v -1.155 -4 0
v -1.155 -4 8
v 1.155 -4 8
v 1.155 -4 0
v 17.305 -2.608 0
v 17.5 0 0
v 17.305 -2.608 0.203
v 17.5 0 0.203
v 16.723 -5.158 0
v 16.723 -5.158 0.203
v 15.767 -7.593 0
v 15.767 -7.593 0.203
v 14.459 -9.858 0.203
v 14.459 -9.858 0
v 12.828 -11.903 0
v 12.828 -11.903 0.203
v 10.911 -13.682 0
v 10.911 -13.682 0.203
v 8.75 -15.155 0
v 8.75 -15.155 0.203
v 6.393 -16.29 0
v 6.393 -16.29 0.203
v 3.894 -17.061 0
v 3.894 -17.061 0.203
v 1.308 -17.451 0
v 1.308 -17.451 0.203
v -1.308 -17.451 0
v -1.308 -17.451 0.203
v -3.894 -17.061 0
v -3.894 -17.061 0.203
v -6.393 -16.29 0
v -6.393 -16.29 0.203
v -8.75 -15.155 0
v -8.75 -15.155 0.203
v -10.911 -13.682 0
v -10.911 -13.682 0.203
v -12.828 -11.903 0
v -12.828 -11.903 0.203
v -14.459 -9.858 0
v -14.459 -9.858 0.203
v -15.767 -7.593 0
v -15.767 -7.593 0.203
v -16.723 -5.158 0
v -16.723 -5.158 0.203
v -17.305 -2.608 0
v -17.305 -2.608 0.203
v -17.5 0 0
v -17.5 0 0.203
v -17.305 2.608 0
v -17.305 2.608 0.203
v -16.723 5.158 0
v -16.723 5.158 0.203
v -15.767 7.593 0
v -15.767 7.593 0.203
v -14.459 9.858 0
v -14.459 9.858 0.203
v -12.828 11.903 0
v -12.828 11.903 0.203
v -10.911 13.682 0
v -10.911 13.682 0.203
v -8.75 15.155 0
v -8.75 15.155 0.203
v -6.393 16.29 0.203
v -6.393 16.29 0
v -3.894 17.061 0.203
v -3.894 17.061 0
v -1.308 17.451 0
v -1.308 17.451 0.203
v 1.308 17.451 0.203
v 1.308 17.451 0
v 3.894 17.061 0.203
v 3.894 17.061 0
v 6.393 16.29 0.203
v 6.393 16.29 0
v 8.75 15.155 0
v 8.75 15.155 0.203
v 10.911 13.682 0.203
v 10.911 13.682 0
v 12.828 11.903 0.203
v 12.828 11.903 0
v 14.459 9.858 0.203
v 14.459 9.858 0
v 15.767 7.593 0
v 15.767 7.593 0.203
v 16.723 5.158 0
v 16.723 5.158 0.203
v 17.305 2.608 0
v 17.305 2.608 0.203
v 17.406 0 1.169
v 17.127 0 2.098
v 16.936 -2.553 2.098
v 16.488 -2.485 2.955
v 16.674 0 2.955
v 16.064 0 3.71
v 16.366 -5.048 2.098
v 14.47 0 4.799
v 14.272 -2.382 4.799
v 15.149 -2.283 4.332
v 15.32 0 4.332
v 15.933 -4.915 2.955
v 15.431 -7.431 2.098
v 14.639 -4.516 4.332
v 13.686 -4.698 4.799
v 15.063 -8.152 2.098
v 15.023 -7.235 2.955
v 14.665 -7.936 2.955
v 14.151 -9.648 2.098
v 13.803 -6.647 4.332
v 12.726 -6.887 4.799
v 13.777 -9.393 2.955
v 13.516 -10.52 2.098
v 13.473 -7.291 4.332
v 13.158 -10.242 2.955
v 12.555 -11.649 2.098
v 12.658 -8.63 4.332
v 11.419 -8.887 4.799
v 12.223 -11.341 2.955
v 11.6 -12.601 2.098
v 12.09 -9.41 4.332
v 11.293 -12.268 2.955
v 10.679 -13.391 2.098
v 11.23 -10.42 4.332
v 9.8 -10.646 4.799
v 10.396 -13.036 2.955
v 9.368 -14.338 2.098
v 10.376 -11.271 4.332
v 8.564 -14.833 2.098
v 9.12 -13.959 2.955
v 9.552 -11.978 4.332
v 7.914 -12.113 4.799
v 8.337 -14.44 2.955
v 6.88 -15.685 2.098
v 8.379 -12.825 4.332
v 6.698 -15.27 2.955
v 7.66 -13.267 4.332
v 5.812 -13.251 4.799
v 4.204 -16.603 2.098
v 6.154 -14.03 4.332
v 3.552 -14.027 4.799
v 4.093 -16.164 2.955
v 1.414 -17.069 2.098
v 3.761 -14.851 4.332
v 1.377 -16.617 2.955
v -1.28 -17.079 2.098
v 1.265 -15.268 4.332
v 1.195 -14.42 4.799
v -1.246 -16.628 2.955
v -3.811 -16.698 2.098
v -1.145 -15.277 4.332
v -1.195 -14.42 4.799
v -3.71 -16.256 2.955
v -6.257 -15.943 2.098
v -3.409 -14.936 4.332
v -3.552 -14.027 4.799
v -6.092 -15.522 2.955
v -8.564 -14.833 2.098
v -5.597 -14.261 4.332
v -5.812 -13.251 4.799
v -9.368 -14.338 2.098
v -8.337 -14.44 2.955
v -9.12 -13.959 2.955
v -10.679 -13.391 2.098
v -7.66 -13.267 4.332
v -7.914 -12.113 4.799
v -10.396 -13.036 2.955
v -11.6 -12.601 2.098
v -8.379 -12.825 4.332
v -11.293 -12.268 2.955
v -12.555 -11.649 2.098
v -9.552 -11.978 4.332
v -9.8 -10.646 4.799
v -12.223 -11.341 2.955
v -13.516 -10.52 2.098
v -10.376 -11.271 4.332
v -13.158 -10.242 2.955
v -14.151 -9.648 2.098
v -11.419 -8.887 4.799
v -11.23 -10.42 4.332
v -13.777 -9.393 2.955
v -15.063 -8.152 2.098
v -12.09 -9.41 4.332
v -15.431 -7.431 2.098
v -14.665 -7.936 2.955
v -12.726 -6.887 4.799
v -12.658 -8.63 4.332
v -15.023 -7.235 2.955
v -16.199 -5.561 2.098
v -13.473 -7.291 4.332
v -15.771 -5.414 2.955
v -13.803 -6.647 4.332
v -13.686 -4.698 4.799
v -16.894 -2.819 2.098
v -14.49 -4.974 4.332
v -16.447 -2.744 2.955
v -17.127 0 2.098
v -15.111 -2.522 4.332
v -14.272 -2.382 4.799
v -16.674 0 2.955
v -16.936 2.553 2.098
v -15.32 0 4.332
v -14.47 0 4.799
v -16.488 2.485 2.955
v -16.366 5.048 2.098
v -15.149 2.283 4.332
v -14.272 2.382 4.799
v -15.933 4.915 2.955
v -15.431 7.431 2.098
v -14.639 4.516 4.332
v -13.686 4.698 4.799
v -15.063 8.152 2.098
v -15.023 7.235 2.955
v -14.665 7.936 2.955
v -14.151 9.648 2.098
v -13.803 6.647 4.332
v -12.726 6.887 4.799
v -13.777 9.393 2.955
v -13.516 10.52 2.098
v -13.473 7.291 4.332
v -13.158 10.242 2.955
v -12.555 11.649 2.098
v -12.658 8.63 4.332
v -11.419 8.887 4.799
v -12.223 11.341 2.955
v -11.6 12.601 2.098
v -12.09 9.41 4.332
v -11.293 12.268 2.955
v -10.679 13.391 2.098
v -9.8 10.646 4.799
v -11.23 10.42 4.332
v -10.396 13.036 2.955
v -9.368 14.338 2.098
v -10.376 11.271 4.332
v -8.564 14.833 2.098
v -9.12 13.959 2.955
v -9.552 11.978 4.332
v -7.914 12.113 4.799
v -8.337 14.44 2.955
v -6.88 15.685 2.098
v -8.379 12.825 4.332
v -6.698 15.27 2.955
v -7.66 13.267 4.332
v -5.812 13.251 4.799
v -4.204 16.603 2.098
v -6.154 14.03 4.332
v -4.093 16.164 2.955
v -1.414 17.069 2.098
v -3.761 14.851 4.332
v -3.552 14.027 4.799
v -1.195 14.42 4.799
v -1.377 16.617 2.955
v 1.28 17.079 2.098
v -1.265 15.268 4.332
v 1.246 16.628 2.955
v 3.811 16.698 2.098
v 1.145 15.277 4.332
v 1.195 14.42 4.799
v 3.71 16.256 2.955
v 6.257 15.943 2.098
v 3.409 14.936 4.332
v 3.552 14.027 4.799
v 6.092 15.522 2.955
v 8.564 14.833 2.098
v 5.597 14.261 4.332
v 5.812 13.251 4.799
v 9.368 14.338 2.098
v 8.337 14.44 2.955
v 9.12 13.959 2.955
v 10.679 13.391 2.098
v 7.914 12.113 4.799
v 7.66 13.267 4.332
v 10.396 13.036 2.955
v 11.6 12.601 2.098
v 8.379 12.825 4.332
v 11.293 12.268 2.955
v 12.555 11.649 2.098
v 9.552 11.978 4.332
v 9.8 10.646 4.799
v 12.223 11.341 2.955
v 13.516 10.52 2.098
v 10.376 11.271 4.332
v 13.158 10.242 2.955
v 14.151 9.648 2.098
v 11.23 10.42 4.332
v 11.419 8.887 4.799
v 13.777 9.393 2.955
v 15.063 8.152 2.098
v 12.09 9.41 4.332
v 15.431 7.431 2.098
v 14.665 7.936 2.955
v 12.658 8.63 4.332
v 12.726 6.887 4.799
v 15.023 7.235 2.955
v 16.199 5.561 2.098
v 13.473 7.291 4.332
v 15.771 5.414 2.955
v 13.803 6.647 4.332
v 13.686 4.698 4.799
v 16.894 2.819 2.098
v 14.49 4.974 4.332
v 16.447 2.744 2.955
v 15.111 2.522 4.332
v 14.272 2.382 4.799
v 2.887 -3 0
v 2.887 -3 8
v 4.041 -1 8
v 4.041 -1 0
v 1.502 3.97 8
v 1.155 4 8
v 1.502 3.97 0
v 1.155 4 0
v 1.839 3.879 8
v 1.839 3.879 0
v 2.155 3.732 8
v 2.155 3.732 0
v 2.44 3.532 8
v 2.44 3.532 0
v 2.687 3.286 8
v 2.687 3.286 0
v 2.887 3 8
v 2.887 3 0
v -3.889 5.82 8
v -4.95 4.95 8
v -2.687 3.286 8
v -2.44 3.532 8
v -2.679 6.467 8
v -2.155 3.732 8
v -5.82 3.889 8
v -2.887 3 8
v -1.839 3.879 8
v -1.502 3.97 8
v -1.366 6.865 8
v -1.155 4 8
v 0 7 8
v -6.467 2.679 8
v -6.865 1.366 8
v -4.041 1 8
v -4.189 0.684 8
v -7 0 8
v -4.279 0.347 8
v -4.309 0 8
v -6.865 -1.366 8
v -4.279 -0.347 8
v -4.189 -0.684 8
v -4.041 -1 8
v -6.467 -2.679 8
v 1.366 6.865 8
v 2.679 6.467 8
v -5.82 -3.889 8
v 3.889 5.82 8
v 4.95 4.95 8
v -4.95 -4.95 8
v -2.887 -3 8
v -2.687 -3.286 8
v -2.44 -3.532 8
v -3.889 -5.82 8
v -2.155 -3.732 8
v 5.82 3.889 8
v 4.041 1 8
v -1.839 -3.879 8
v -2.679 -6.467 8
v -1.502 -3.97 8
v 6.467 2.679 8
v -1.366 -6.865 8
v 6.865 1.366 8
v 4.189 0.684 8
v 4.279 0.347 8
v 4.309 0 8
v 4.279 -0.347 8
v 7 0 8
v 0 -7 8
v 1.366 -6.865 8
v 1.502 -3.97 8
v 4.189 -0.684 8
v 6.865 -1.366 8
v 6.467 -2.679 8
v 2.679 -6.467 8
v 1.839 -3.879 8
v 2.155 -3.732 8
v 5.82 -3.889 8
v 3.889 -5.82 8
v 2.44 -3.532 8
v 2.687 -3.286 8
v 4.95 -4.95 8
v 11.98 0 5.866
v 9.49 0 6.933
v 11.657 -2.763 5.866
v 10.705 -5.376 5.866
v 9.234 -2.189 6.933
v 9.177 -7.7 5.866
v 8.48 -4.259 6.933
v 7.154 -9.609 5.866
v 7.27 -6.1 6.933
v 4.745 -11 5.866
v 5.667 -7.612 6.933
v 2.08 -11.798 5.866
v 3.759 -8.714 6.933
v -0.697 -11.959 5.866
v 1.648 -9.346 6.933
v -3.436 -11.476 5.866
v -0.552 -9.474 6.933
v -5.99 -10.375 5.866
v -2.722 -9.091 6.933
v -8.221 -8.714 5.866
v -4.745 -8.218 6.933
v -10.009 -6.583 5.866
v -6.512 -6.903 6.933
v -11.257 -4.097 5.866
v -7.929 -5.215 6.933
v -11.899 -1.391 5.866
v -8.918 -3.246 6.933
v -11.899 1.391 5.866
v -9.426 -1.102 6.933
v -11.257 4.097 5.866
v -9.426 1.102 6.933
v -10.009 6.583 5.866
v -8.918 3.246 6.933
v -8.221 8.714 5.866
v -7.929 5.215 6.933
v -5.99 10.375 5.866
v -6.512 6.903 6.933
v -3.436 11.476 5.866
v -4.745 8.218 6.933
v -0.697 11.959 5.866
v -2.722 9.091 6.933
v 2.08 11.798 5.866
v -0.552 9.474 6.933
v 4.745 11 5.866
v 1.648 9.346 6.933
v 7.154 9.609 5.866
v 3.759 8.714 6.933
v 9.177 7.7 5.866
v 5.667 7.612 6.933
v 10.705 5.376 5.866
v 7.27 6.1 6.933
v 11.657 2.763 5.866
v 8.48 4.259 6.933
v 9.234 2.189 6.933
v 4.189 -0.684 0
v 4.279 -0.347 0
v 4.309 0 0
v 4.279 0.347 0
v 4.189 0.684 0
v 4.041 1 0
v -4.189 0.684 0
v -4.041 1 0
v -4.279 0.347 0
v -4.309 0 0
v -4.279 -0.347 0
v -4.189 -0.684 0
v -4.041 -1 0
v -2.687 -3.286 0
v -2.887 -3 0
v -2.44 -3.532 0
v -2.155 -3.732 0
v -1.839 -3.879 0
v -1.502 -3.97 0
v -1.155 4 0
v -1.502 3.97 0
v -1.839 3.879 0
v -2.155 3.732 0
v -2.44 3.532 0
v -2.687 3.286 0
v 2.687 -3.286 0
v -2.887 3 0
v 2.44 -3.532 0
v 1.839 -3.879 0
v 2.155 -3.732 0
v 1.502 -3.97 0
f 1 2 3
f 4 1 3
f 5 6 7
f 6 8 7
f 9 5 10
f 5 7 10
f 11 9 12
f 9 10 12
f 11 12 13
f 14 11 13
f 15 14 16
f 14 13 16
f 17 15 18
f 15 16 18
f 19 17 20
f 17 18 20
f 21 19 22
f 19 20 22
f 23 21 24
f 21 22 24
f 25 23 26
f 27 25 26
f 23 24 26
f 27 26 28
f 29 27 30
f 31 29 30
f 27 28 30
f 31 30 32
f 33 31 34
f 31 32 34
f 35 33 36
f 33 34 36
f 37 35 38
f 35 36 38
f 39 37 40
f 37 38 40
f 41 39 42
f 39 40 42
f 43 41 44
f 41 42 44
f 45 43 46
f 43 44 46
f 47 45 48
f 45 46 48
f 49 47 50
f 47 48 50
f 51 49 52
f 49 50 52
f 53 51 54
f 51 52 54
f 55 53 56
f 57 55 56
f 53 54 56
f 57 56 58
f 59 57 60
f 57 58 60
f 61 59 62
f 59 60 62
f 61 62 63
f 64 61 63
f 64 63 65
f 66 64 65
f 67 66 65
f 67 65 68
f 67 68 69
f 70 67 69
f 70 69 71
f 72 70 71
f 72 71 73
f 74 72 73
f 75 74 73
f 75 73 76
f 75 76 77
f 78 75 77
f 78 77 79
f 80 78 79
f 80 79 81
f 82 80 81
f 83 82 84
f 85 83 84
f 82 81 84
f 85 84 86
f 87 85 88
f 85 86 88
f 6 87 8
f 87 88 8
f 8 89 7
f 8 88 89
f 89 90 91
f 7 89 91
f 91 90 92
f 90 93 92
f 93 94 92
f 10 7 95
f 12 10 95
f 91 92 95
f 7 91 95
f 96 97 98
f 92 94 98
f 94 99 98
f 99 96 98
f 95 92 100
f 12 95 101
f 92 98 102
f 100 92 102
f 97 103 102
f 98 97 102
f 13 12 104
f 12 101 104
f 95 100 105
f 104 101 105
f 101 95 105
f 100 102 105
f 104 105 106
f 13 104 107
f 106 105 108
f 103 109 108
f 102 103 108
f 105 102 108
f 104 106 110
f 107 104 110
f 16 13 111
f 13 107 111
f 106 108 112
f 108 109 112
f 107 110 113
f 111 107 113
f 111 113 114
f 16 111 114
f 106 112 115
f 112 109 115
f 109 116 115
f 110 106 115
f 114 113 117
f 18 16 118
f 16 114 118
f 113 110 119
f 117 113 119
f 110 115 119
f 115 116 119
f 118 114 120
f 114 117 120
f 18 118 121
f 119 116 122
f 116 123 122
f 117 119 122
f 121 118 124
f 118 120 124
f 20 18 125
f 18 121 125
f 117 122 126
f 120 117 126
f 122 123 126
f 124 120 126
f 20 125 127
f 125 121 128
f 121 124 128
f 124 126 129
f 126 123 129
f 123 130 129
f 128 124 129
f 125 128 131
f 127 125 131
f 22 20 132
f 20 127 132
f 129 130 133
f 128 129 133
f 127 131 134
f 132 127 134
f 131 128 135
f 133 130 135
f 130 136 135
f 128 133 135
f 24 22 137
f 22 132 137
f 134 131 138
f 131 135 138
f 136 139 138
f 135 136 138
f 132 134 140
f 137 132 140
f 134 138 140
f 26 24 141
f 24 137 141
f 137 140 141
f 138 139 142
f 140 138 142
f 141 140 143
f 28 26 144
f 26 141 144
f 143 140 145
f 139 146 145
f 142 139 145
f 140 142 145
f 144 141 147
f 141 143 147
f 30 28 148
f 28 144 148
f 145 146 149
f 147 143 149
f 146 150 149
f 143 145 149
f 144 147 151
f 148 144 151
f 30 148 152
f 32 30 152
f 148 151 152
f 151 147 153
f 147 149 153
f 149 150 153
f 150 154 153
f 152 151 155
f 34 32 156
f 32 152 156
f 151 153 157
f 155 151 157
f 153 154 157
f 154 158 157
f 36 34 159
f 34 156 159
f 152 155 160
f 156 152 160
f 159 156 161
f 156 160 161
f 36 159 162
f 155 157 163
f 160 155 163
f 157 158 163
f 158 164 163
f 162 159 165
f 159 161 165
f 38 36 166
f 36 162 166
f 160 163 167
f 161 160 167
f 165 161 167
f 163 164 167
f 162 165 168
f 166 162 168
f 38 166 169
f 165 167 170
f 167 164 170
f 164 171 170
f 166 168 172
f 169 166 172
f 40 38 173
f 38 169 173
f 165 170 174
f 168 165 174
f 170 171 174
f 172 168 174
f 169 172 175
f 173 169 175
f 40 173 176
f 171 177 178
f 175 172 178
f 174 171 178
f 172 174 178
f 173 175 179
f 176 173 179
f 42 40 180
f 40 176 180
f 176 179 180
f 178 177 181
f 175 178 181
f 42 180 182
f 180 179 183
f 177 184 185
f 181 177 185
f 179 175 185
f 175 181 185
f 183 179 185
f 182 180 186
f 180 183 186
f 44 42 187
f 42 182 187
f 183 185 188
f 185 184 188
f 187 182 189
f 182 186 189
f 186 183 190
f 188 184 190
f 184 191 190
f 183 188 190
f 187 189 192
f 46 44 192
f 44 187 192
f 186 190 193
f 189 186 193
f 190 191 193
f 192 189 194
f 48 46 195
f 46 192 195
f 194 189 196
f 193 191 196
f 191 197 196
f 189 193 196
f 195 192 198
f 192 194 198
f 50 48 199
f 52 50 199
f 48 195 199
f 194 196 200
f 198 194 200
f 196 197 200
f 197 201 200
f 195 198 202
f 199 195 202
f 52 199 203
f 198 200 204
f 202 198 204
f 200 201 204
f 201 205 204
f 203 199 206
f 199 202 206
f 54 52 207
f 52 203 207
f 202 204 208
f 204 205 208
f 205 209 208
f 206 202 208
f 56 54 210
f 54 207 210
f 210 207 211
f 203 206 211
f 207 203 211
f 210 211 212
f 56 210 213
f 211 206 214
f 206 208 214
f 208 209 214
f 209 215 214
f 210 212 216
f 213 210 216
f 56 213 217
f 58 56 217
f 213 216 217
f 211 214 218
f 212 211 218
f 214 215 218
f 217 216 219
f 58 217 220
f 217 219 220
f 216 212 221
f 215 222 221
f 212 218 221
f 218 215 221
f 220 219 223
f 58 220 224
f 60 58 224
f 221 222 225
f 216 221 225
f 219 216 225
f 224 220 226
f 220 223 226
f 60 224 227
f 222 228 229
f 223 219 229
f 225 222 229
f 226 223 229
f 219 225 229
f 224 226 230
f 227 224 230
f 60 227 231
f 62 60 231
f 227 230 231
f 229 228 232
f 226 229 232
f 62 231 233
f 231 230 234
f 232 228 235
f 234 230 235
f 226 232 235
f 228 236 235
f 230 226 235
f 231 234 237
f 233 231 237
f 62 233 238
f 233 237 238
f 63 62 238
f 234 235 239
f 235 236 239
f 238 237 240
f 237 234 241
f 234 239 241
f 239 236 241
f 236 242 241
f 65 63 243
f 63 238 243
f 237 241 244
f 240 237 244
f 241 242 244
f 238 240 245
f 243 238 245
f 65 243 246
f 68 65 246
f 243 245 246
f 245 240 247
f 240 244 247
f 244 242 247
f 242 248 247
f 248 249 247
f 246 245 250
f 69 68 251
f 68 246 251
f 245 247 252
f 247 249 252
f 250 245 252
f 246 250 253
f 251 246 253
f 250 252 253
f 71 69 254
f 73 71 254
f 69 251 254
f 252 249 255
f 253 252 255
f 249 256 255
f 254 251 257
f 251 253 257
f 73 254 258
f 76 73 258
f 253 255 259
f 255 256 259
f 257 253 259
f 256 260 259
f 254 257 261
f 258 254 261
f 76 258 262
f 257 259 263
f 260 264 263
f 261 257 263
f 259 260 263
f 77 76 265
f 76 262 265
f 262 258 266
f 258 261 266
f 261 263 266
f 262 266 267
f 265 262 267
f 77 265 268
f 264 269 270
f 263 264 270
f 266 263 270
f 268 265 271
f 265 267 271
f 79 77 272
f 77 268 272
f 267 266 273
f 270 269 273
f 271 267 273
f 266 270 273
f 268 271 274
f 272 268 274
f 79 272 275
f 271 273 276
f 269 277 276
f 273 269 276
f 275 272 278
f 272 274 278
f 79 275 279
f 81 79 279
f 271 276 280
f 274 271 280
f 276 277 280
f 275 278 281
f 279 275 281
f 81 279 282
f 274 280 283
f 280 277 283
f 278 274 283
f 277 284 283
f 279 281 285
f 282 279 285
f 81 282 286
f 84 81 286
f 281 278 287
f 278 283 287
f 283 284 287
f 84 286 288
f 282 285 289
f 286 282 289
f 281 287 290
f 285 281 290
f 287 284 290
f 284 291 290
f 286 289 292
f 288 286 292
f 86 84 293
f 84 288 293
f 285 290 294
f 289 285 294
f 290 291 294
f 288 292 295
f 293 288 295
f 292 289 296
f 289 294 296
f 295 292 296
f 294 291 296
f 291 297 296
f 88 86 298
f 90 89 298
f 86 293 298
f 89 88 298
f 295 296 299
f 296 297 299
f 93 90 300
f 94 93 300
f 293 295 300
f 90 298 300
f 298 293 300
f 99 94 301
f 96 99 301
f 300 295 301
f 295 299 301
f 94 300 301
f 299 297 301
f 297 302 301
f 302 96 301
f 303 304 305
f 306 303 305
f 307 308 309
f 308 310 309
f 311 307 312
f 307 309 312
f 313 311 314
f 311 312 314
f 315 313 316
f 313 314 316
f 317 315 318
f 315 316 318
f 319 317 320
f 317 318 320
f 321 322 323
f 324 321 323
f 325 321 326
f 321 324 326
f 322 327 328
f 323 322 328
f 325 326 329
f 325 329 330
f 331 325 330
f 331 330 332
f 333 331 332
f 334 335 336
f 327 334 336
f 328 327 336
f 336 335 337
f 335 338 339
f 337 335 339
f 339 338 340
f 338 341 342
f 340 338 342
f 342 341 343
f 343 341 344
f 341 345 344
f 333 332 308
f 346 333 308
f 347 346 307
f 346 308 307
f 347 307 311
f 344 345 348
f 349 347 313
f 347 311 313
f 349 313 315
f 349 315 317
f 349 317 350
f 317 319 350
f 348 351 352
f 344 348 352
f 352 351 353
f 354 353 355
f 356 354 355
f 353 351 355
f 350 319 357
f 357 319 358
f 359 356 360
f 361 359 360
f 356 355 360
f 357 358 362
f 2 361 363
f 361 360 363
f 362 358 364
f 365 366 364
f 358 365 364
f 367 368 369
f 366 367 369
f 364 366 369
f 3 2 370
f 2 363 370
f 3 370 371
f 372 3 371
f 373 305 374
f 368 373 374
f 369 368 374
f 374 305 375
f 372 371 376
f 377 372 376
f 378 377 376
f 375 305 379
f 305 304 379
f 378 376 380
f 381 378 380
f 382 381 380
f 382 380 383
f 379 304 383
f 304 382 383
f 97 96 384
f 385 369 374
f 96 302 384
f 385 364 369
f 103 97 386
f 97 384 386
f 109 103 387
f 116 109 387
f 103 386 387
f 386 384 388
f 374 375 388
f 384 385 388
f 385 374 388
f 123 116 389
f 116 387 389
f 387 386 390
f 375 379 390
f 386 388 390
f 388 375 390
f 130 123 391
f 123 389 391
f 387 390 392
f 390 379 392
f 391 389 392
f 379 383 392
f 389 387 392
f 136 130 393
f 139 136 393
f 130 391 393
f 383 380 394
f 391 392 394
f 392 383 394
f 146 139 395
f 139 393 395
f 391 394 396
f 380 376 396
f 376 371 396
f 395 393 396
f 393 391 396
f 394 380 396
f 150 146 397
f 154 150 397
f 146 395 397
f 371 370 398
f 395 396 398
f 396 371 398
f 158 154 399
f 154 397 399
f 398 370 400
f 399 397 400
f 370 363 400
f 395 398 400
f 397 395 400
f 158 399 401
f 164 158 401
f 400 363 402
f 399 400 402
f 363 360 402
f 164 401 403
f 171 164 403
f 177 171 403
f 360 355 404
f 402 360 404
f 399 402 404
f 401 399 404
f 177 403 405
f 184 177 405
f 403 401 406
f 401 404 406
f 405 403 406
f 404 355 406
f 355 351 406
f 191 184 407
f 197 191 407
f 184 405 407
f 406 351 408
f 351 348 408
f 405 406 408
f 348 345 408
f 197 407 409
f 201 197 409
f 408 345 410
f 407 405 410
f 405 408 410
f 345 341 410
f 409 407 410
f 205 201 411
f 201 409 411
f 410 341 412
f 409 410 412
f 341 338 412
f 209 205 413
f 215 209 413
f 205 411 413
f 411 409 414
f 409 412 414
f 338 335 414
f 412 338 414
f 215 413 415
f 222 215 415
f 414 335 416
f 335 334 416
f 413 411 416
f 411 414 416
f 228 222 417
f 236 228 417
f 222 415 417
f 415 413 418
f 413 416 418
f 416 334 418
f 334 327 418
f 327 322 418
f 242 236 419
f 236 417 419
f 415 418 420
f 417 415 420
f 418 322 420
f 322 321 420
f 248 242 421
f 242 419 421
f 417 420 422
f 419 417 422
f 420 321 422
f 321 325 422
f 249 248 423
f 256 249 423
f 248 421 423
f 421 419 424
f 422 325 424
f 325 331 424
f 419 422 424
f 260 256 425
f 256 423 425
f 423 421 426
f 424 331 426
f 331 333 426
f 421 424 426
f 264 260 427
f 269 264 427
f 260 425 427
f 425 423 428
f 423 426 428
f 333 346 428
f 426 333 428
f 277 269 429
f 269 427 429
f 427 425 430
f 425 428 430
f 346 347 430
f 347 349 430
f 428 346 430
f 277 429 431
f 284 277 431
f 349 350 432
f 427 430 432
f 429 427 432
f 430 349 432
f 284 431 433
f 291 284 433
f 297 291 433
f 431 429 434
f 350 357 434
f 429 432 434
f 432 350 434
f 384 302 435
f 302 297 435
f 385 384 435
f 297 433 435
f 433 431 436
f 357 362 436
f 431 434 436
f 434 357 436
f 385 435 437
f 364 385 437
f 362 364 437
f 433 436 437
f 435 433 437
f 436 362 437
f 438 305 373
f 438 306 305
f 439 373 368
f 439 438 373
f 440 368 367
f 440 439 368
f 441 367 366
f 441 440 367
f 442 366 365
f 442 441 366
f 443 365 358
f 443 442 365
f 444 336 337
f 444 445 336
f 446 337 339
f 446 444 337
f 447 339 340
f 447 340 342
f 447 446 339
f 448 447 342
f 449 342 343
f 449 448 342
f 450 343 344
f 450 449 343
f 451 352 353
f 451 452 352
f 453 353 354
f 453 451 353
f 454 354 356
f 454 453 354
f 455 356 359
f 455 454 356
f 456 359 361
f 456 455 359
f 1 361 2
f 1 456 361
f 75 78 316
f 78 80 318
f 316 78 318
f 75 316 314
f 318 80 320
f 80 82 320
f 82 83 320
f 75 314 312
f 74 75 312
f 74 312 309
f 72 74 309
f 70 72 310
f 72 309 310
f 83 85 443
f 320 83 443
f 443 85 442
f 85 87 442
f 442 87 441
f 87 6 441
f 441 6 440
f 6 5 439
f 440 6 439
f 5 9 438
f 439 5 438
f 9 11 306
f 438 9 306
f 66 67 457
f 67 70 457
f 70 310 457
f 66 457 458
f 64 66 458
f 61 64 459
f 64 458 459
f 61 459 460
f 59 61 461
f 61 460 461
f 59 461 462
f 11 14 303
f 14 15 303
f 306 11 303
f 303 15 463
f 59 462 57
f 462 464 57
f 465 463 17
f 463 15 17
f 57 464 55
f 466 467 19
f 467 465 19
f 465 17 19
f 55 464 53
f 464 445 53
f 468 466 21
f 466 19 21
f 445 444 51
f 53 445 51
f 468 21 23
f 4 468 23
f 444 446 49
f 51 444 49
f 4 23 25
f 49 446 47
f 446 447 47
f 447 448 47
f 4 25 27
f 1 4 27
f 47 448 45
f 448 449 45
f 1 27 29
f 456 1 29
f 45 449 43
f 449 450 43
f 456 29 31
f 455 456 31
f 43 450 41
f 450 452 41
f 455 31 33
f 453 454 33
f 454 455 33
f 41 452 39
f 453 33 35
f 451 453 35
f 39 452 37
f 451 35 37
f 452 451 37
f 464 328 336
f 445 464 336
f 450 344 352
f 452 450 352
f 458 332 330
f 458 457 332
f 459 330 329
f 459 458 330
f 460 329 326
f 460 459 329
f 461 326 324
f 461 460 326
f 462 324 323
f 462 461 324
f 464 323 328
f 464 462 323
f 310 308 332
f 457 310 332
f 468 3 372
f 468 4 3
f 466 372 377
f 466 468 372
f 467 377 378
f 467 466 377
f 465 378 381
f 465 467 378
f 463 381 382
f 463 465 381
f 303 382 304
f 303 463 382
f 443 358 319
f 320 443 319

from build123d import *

# Parameters (mm, degrees)
F3_DEPTH = 25
F4_R     = 2


with BuildPart() as f1:
    # F0 (on Front) → F1 (revolve)
    with BuildSketch(Plane.XZ):
        with BuildLine():
            Line((0, 8), (0, 0))
            Line((0, 0), (17.5, 0))
            Line((17.5, 0), (17.5, 0.203019))
            ThreePointArc((17.5, 0.203019), (16.674205, 2.955474), (14.469596, 4.798744))
            Line((14.469596, 4.798744), (7, 8))
            Line((7, 8), (0, 8))
        make_face()
    revolve(axis=Axis((0, 0, -4.491808), (0, 0, -1)))

    # F2 (on face) → F3 (cut)
    with BuildSketch(Plane.XY.offset(8)):
        Polygon((2.309401, 4), (-2.309401, 4), (-4.618802, 0), (-2.309401, -4), (2.309401, -4), (4.618802, 0), align=None)
    extrude(amount=-F3_DEPTH, mode=Mode.SUBTRACT)

    # F4
    f4_edges = [f1.edges().sort_by_distance(p)[0] for p in [
        (-2.309401, 4, 4),
        (-4.618802, 0, 4),
        (2.309401, 4, 4),
        (4.618802, 0, 4),
        (-2.309401, -4, 4),
        (2.309401, -4, 4),
    ]]
    fillet(f4_edges, radius=F4_R)


solid = f1.part
